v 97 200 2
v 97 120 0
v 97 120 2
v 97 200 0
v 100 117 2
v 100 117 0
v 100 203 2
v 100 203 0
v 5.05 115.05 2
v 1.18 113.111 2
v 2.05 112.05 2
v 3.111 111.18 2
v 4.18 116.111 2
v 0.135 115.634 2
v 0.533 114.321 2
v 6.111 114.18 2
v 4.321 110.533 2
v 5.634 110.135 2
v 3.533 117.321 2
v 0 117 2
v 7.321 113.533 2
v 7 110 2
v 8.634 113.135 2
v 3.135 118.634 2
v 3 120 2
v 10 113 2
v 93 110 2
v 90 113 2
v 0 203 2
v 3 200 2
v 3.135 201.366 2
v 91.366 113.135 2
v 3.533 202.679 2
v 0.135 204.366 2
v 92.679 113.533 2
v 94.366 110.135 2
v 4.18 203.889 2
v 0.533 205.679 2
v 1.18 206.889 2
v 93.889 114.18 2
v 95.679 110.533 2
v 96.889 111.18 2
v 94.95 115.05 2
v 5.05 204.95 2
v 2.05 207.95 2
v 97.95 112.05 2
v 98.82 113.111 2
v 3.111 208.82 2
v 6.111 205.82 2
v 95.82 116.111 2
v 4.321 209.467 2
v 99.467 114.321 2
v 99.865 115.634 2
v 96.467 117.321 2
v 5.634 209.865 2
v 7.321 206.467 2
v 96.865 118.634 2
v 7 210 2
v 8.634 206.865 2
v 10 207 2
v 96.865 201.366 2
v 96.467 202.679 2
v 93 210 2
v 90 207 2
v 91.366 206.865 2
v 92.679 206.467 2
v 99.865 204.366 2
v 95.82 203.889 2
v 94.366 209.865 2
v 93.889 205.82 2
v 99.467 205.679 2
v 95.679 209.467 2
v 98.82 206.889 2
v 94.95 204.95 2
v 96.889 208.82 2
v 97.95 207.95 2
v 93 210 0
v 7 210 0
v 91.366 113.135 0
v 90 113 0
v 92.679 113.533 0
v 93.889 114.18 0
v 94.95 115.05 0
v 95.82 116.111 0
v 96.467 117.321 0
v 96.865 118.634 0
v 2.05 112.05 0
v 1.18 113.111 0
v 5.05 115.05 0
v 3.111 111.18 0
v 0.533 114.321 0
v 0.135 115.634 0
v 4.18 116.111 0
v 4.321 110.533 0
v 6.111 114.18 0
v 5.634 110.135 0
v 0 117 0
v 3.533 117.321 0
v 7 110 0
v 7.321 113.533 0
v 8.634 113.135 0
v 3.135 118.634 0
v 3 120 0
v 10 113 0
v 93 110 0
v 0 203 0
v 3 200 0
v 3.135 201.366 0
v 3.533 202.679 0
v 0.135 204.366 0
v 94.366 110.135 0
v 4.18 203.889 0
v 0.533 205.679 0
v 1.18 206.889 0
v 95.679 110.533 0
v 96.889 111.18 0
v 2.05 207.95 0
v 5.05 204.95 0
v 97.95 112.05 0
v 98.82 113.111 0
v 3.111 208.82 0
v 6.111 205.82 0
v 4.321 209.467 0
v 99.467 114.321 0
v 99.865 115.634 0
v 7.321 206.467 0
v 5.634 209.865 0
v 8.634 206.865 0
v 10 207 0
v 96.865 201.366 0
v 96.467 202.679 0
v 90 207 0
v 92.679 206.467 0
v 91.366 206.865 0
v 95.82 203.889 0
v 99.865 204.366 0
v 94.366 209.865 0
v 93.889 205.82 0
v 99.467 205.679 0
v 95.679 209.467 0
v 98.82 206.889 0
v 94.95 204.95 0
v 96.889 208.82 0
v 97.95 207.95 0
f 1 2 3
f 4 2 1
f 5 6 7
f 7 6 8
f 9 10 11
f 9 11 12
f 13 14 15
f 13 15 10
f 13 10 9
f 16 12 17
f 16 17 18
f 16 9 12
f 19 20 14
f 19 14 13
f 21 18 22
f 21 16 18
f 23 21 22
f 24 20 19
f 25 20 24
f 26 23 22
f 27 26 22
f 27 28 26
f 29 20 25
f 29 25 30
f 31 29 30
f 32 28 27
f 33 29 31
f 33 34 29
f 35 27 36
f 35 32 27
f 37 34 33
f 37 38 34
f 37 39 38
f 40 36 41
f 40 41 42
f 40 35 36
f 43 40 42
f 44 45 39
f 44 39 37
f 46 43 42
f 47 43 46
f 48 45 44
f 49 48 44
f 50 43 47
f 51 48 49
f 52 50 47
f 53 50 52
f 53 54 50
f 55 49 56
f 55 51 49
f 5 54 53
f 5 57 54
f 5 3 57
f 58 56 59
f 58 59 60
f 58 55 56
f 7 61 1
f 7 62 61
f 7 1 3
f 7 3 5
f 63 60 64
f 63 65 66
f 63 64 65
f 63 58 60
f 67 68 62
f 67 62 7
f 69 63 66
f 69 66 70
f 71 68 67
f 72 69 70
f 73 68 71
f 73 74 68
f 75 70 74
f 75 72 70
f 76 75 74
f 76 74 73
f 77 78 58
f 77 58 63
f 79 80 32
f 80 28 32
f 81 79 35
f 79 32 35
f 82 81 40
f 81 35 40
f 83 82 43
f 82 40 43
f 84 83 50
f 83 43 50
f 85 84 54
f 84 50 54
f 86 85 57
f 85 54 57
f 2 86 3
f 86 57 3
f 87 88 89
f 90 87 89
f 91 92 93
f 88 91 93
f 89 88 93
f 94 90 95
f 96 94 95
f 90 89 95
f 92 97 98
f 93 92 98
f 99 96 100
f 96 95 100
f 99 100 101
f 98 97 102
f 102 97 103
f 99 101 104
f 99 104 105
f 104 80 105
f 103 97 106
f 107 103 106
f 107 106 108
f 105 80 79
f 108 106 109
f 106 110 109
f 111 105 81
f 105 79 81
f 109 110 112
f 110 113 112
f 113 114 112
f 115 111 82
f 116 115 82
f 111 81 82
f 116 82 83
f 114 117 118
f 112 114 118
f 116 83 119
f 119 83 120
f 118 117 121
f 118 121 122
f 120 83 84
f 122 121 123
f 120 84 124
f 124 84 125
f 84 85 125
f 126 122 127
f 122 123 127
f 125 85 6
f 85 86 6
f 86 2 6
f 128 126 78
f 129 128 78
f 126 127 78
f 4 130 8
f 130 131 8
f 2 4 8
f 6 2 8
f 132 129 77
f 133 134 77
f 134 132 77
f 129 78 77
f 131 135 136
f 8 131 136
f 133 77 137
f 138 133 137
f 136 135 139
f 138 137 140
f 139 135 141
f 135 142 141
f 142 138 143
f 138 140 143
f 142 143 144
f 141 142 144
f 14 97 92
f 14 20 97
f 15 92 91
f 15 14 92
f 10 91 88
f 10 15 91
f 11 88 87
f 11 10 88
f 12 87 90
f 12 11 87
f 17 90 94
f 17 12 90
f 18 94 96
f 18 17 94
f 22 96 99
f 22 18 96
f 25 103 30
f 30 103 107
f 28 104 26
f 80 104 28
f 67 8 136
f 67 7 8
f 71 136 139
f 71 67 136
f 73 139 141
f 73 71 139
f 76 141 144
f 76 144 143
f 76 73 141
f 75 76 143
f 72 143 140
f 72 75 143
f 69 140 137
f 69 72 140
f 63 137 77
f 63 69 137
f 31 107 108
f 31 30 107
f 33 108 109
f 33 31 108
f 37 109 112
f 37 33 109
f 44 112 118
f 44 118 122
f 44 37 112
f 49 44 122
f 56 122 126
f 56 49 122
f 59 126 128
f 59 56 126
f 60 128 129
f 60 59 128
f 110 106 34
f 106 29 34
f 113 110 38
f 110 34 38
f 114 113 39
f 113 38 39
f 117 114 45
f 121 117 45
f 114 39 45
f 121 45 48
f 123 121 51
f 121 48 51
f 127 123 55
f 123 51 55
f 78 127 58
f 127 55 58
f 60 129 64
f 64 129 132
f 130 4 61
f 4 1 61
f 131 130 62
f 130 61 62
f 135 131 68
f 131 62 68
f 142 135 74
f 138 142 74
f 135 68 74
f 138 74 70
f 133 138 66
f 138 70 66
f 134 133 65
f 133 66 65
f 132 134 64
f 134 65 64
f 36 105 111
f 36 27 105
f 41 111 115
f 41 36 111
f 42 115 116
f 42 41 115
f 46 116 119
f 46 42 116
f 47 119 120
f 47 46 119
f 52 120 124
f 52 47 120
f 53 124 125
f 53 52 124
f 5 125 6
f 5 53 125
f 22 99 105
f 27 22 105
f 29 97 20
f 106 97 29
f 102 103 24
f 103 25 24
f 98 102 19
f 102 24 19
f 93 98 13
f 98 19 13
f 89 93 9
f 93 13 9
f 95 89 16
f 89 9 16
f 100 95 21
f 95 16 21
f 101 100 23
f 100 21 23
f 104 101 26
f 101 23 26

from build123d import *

# Parameters (mm, degrees)
BOX010_W     = 94
BOX010_H     = 94
BOX010_DEPTH = 2
FILLET011_R  = 7
BOX009_W     = 100
BOX009_H     = 100
BOX009_DEPTH = 2
FILLET010_R  = 7


with BuildPart() as top_with_fillets004:
    # Box010 → Box010 (new body)
    with BuildSketch(Plane(origin=(3, 3, 0), x_dir=(1, 0, 0), z_dir=(0, 0, 1))):
        with Locations((47, 47)):
            Rectangle(BOX010_W, BOX010_H)
    extrude(amount=BOX010_DEPTH)

    # Fillet011
    fillet011_edges = [top_with_fillets004.edges().sort_by_distance(p)[0] for p in [
        (3, 3, 1),
        (3, 97, 1),
        (97, 3, 1),
        (97, 97, 1),
    ]]
    fillet(fillet011_edges, radius=FILLET011_R)


with BuildPart() as stacker:
    # Box009 → Box009 (new body)
    with BuildSketch(Plane.XY):
        with Locations((50, 50)):
            Rectangle(BOX009_W, BOX009_H)
    extrude(amount=BOX009_DEPTH)

    # Fillet010
    fillet010_edges = [stacker.edges().sort_by_distance(p)[0] for p in [
        (0, 0, 1),
        (0, 100, 1),
        (100, 0, 1),
        (100, 100, 1),
    ]]
    fillet(fillet010_edges, radius=FILLET010_R)

    # Cut003: cut Top with fillets004
    add(top_with_fillets004.part, mode=Mode.SUBTRACT)


with BuildPart() as stacker_1:
    # Cut003 placement: moved
    add(stacker.part.moved(Location((0, 110, 0))))


solid = stacker_1.part
